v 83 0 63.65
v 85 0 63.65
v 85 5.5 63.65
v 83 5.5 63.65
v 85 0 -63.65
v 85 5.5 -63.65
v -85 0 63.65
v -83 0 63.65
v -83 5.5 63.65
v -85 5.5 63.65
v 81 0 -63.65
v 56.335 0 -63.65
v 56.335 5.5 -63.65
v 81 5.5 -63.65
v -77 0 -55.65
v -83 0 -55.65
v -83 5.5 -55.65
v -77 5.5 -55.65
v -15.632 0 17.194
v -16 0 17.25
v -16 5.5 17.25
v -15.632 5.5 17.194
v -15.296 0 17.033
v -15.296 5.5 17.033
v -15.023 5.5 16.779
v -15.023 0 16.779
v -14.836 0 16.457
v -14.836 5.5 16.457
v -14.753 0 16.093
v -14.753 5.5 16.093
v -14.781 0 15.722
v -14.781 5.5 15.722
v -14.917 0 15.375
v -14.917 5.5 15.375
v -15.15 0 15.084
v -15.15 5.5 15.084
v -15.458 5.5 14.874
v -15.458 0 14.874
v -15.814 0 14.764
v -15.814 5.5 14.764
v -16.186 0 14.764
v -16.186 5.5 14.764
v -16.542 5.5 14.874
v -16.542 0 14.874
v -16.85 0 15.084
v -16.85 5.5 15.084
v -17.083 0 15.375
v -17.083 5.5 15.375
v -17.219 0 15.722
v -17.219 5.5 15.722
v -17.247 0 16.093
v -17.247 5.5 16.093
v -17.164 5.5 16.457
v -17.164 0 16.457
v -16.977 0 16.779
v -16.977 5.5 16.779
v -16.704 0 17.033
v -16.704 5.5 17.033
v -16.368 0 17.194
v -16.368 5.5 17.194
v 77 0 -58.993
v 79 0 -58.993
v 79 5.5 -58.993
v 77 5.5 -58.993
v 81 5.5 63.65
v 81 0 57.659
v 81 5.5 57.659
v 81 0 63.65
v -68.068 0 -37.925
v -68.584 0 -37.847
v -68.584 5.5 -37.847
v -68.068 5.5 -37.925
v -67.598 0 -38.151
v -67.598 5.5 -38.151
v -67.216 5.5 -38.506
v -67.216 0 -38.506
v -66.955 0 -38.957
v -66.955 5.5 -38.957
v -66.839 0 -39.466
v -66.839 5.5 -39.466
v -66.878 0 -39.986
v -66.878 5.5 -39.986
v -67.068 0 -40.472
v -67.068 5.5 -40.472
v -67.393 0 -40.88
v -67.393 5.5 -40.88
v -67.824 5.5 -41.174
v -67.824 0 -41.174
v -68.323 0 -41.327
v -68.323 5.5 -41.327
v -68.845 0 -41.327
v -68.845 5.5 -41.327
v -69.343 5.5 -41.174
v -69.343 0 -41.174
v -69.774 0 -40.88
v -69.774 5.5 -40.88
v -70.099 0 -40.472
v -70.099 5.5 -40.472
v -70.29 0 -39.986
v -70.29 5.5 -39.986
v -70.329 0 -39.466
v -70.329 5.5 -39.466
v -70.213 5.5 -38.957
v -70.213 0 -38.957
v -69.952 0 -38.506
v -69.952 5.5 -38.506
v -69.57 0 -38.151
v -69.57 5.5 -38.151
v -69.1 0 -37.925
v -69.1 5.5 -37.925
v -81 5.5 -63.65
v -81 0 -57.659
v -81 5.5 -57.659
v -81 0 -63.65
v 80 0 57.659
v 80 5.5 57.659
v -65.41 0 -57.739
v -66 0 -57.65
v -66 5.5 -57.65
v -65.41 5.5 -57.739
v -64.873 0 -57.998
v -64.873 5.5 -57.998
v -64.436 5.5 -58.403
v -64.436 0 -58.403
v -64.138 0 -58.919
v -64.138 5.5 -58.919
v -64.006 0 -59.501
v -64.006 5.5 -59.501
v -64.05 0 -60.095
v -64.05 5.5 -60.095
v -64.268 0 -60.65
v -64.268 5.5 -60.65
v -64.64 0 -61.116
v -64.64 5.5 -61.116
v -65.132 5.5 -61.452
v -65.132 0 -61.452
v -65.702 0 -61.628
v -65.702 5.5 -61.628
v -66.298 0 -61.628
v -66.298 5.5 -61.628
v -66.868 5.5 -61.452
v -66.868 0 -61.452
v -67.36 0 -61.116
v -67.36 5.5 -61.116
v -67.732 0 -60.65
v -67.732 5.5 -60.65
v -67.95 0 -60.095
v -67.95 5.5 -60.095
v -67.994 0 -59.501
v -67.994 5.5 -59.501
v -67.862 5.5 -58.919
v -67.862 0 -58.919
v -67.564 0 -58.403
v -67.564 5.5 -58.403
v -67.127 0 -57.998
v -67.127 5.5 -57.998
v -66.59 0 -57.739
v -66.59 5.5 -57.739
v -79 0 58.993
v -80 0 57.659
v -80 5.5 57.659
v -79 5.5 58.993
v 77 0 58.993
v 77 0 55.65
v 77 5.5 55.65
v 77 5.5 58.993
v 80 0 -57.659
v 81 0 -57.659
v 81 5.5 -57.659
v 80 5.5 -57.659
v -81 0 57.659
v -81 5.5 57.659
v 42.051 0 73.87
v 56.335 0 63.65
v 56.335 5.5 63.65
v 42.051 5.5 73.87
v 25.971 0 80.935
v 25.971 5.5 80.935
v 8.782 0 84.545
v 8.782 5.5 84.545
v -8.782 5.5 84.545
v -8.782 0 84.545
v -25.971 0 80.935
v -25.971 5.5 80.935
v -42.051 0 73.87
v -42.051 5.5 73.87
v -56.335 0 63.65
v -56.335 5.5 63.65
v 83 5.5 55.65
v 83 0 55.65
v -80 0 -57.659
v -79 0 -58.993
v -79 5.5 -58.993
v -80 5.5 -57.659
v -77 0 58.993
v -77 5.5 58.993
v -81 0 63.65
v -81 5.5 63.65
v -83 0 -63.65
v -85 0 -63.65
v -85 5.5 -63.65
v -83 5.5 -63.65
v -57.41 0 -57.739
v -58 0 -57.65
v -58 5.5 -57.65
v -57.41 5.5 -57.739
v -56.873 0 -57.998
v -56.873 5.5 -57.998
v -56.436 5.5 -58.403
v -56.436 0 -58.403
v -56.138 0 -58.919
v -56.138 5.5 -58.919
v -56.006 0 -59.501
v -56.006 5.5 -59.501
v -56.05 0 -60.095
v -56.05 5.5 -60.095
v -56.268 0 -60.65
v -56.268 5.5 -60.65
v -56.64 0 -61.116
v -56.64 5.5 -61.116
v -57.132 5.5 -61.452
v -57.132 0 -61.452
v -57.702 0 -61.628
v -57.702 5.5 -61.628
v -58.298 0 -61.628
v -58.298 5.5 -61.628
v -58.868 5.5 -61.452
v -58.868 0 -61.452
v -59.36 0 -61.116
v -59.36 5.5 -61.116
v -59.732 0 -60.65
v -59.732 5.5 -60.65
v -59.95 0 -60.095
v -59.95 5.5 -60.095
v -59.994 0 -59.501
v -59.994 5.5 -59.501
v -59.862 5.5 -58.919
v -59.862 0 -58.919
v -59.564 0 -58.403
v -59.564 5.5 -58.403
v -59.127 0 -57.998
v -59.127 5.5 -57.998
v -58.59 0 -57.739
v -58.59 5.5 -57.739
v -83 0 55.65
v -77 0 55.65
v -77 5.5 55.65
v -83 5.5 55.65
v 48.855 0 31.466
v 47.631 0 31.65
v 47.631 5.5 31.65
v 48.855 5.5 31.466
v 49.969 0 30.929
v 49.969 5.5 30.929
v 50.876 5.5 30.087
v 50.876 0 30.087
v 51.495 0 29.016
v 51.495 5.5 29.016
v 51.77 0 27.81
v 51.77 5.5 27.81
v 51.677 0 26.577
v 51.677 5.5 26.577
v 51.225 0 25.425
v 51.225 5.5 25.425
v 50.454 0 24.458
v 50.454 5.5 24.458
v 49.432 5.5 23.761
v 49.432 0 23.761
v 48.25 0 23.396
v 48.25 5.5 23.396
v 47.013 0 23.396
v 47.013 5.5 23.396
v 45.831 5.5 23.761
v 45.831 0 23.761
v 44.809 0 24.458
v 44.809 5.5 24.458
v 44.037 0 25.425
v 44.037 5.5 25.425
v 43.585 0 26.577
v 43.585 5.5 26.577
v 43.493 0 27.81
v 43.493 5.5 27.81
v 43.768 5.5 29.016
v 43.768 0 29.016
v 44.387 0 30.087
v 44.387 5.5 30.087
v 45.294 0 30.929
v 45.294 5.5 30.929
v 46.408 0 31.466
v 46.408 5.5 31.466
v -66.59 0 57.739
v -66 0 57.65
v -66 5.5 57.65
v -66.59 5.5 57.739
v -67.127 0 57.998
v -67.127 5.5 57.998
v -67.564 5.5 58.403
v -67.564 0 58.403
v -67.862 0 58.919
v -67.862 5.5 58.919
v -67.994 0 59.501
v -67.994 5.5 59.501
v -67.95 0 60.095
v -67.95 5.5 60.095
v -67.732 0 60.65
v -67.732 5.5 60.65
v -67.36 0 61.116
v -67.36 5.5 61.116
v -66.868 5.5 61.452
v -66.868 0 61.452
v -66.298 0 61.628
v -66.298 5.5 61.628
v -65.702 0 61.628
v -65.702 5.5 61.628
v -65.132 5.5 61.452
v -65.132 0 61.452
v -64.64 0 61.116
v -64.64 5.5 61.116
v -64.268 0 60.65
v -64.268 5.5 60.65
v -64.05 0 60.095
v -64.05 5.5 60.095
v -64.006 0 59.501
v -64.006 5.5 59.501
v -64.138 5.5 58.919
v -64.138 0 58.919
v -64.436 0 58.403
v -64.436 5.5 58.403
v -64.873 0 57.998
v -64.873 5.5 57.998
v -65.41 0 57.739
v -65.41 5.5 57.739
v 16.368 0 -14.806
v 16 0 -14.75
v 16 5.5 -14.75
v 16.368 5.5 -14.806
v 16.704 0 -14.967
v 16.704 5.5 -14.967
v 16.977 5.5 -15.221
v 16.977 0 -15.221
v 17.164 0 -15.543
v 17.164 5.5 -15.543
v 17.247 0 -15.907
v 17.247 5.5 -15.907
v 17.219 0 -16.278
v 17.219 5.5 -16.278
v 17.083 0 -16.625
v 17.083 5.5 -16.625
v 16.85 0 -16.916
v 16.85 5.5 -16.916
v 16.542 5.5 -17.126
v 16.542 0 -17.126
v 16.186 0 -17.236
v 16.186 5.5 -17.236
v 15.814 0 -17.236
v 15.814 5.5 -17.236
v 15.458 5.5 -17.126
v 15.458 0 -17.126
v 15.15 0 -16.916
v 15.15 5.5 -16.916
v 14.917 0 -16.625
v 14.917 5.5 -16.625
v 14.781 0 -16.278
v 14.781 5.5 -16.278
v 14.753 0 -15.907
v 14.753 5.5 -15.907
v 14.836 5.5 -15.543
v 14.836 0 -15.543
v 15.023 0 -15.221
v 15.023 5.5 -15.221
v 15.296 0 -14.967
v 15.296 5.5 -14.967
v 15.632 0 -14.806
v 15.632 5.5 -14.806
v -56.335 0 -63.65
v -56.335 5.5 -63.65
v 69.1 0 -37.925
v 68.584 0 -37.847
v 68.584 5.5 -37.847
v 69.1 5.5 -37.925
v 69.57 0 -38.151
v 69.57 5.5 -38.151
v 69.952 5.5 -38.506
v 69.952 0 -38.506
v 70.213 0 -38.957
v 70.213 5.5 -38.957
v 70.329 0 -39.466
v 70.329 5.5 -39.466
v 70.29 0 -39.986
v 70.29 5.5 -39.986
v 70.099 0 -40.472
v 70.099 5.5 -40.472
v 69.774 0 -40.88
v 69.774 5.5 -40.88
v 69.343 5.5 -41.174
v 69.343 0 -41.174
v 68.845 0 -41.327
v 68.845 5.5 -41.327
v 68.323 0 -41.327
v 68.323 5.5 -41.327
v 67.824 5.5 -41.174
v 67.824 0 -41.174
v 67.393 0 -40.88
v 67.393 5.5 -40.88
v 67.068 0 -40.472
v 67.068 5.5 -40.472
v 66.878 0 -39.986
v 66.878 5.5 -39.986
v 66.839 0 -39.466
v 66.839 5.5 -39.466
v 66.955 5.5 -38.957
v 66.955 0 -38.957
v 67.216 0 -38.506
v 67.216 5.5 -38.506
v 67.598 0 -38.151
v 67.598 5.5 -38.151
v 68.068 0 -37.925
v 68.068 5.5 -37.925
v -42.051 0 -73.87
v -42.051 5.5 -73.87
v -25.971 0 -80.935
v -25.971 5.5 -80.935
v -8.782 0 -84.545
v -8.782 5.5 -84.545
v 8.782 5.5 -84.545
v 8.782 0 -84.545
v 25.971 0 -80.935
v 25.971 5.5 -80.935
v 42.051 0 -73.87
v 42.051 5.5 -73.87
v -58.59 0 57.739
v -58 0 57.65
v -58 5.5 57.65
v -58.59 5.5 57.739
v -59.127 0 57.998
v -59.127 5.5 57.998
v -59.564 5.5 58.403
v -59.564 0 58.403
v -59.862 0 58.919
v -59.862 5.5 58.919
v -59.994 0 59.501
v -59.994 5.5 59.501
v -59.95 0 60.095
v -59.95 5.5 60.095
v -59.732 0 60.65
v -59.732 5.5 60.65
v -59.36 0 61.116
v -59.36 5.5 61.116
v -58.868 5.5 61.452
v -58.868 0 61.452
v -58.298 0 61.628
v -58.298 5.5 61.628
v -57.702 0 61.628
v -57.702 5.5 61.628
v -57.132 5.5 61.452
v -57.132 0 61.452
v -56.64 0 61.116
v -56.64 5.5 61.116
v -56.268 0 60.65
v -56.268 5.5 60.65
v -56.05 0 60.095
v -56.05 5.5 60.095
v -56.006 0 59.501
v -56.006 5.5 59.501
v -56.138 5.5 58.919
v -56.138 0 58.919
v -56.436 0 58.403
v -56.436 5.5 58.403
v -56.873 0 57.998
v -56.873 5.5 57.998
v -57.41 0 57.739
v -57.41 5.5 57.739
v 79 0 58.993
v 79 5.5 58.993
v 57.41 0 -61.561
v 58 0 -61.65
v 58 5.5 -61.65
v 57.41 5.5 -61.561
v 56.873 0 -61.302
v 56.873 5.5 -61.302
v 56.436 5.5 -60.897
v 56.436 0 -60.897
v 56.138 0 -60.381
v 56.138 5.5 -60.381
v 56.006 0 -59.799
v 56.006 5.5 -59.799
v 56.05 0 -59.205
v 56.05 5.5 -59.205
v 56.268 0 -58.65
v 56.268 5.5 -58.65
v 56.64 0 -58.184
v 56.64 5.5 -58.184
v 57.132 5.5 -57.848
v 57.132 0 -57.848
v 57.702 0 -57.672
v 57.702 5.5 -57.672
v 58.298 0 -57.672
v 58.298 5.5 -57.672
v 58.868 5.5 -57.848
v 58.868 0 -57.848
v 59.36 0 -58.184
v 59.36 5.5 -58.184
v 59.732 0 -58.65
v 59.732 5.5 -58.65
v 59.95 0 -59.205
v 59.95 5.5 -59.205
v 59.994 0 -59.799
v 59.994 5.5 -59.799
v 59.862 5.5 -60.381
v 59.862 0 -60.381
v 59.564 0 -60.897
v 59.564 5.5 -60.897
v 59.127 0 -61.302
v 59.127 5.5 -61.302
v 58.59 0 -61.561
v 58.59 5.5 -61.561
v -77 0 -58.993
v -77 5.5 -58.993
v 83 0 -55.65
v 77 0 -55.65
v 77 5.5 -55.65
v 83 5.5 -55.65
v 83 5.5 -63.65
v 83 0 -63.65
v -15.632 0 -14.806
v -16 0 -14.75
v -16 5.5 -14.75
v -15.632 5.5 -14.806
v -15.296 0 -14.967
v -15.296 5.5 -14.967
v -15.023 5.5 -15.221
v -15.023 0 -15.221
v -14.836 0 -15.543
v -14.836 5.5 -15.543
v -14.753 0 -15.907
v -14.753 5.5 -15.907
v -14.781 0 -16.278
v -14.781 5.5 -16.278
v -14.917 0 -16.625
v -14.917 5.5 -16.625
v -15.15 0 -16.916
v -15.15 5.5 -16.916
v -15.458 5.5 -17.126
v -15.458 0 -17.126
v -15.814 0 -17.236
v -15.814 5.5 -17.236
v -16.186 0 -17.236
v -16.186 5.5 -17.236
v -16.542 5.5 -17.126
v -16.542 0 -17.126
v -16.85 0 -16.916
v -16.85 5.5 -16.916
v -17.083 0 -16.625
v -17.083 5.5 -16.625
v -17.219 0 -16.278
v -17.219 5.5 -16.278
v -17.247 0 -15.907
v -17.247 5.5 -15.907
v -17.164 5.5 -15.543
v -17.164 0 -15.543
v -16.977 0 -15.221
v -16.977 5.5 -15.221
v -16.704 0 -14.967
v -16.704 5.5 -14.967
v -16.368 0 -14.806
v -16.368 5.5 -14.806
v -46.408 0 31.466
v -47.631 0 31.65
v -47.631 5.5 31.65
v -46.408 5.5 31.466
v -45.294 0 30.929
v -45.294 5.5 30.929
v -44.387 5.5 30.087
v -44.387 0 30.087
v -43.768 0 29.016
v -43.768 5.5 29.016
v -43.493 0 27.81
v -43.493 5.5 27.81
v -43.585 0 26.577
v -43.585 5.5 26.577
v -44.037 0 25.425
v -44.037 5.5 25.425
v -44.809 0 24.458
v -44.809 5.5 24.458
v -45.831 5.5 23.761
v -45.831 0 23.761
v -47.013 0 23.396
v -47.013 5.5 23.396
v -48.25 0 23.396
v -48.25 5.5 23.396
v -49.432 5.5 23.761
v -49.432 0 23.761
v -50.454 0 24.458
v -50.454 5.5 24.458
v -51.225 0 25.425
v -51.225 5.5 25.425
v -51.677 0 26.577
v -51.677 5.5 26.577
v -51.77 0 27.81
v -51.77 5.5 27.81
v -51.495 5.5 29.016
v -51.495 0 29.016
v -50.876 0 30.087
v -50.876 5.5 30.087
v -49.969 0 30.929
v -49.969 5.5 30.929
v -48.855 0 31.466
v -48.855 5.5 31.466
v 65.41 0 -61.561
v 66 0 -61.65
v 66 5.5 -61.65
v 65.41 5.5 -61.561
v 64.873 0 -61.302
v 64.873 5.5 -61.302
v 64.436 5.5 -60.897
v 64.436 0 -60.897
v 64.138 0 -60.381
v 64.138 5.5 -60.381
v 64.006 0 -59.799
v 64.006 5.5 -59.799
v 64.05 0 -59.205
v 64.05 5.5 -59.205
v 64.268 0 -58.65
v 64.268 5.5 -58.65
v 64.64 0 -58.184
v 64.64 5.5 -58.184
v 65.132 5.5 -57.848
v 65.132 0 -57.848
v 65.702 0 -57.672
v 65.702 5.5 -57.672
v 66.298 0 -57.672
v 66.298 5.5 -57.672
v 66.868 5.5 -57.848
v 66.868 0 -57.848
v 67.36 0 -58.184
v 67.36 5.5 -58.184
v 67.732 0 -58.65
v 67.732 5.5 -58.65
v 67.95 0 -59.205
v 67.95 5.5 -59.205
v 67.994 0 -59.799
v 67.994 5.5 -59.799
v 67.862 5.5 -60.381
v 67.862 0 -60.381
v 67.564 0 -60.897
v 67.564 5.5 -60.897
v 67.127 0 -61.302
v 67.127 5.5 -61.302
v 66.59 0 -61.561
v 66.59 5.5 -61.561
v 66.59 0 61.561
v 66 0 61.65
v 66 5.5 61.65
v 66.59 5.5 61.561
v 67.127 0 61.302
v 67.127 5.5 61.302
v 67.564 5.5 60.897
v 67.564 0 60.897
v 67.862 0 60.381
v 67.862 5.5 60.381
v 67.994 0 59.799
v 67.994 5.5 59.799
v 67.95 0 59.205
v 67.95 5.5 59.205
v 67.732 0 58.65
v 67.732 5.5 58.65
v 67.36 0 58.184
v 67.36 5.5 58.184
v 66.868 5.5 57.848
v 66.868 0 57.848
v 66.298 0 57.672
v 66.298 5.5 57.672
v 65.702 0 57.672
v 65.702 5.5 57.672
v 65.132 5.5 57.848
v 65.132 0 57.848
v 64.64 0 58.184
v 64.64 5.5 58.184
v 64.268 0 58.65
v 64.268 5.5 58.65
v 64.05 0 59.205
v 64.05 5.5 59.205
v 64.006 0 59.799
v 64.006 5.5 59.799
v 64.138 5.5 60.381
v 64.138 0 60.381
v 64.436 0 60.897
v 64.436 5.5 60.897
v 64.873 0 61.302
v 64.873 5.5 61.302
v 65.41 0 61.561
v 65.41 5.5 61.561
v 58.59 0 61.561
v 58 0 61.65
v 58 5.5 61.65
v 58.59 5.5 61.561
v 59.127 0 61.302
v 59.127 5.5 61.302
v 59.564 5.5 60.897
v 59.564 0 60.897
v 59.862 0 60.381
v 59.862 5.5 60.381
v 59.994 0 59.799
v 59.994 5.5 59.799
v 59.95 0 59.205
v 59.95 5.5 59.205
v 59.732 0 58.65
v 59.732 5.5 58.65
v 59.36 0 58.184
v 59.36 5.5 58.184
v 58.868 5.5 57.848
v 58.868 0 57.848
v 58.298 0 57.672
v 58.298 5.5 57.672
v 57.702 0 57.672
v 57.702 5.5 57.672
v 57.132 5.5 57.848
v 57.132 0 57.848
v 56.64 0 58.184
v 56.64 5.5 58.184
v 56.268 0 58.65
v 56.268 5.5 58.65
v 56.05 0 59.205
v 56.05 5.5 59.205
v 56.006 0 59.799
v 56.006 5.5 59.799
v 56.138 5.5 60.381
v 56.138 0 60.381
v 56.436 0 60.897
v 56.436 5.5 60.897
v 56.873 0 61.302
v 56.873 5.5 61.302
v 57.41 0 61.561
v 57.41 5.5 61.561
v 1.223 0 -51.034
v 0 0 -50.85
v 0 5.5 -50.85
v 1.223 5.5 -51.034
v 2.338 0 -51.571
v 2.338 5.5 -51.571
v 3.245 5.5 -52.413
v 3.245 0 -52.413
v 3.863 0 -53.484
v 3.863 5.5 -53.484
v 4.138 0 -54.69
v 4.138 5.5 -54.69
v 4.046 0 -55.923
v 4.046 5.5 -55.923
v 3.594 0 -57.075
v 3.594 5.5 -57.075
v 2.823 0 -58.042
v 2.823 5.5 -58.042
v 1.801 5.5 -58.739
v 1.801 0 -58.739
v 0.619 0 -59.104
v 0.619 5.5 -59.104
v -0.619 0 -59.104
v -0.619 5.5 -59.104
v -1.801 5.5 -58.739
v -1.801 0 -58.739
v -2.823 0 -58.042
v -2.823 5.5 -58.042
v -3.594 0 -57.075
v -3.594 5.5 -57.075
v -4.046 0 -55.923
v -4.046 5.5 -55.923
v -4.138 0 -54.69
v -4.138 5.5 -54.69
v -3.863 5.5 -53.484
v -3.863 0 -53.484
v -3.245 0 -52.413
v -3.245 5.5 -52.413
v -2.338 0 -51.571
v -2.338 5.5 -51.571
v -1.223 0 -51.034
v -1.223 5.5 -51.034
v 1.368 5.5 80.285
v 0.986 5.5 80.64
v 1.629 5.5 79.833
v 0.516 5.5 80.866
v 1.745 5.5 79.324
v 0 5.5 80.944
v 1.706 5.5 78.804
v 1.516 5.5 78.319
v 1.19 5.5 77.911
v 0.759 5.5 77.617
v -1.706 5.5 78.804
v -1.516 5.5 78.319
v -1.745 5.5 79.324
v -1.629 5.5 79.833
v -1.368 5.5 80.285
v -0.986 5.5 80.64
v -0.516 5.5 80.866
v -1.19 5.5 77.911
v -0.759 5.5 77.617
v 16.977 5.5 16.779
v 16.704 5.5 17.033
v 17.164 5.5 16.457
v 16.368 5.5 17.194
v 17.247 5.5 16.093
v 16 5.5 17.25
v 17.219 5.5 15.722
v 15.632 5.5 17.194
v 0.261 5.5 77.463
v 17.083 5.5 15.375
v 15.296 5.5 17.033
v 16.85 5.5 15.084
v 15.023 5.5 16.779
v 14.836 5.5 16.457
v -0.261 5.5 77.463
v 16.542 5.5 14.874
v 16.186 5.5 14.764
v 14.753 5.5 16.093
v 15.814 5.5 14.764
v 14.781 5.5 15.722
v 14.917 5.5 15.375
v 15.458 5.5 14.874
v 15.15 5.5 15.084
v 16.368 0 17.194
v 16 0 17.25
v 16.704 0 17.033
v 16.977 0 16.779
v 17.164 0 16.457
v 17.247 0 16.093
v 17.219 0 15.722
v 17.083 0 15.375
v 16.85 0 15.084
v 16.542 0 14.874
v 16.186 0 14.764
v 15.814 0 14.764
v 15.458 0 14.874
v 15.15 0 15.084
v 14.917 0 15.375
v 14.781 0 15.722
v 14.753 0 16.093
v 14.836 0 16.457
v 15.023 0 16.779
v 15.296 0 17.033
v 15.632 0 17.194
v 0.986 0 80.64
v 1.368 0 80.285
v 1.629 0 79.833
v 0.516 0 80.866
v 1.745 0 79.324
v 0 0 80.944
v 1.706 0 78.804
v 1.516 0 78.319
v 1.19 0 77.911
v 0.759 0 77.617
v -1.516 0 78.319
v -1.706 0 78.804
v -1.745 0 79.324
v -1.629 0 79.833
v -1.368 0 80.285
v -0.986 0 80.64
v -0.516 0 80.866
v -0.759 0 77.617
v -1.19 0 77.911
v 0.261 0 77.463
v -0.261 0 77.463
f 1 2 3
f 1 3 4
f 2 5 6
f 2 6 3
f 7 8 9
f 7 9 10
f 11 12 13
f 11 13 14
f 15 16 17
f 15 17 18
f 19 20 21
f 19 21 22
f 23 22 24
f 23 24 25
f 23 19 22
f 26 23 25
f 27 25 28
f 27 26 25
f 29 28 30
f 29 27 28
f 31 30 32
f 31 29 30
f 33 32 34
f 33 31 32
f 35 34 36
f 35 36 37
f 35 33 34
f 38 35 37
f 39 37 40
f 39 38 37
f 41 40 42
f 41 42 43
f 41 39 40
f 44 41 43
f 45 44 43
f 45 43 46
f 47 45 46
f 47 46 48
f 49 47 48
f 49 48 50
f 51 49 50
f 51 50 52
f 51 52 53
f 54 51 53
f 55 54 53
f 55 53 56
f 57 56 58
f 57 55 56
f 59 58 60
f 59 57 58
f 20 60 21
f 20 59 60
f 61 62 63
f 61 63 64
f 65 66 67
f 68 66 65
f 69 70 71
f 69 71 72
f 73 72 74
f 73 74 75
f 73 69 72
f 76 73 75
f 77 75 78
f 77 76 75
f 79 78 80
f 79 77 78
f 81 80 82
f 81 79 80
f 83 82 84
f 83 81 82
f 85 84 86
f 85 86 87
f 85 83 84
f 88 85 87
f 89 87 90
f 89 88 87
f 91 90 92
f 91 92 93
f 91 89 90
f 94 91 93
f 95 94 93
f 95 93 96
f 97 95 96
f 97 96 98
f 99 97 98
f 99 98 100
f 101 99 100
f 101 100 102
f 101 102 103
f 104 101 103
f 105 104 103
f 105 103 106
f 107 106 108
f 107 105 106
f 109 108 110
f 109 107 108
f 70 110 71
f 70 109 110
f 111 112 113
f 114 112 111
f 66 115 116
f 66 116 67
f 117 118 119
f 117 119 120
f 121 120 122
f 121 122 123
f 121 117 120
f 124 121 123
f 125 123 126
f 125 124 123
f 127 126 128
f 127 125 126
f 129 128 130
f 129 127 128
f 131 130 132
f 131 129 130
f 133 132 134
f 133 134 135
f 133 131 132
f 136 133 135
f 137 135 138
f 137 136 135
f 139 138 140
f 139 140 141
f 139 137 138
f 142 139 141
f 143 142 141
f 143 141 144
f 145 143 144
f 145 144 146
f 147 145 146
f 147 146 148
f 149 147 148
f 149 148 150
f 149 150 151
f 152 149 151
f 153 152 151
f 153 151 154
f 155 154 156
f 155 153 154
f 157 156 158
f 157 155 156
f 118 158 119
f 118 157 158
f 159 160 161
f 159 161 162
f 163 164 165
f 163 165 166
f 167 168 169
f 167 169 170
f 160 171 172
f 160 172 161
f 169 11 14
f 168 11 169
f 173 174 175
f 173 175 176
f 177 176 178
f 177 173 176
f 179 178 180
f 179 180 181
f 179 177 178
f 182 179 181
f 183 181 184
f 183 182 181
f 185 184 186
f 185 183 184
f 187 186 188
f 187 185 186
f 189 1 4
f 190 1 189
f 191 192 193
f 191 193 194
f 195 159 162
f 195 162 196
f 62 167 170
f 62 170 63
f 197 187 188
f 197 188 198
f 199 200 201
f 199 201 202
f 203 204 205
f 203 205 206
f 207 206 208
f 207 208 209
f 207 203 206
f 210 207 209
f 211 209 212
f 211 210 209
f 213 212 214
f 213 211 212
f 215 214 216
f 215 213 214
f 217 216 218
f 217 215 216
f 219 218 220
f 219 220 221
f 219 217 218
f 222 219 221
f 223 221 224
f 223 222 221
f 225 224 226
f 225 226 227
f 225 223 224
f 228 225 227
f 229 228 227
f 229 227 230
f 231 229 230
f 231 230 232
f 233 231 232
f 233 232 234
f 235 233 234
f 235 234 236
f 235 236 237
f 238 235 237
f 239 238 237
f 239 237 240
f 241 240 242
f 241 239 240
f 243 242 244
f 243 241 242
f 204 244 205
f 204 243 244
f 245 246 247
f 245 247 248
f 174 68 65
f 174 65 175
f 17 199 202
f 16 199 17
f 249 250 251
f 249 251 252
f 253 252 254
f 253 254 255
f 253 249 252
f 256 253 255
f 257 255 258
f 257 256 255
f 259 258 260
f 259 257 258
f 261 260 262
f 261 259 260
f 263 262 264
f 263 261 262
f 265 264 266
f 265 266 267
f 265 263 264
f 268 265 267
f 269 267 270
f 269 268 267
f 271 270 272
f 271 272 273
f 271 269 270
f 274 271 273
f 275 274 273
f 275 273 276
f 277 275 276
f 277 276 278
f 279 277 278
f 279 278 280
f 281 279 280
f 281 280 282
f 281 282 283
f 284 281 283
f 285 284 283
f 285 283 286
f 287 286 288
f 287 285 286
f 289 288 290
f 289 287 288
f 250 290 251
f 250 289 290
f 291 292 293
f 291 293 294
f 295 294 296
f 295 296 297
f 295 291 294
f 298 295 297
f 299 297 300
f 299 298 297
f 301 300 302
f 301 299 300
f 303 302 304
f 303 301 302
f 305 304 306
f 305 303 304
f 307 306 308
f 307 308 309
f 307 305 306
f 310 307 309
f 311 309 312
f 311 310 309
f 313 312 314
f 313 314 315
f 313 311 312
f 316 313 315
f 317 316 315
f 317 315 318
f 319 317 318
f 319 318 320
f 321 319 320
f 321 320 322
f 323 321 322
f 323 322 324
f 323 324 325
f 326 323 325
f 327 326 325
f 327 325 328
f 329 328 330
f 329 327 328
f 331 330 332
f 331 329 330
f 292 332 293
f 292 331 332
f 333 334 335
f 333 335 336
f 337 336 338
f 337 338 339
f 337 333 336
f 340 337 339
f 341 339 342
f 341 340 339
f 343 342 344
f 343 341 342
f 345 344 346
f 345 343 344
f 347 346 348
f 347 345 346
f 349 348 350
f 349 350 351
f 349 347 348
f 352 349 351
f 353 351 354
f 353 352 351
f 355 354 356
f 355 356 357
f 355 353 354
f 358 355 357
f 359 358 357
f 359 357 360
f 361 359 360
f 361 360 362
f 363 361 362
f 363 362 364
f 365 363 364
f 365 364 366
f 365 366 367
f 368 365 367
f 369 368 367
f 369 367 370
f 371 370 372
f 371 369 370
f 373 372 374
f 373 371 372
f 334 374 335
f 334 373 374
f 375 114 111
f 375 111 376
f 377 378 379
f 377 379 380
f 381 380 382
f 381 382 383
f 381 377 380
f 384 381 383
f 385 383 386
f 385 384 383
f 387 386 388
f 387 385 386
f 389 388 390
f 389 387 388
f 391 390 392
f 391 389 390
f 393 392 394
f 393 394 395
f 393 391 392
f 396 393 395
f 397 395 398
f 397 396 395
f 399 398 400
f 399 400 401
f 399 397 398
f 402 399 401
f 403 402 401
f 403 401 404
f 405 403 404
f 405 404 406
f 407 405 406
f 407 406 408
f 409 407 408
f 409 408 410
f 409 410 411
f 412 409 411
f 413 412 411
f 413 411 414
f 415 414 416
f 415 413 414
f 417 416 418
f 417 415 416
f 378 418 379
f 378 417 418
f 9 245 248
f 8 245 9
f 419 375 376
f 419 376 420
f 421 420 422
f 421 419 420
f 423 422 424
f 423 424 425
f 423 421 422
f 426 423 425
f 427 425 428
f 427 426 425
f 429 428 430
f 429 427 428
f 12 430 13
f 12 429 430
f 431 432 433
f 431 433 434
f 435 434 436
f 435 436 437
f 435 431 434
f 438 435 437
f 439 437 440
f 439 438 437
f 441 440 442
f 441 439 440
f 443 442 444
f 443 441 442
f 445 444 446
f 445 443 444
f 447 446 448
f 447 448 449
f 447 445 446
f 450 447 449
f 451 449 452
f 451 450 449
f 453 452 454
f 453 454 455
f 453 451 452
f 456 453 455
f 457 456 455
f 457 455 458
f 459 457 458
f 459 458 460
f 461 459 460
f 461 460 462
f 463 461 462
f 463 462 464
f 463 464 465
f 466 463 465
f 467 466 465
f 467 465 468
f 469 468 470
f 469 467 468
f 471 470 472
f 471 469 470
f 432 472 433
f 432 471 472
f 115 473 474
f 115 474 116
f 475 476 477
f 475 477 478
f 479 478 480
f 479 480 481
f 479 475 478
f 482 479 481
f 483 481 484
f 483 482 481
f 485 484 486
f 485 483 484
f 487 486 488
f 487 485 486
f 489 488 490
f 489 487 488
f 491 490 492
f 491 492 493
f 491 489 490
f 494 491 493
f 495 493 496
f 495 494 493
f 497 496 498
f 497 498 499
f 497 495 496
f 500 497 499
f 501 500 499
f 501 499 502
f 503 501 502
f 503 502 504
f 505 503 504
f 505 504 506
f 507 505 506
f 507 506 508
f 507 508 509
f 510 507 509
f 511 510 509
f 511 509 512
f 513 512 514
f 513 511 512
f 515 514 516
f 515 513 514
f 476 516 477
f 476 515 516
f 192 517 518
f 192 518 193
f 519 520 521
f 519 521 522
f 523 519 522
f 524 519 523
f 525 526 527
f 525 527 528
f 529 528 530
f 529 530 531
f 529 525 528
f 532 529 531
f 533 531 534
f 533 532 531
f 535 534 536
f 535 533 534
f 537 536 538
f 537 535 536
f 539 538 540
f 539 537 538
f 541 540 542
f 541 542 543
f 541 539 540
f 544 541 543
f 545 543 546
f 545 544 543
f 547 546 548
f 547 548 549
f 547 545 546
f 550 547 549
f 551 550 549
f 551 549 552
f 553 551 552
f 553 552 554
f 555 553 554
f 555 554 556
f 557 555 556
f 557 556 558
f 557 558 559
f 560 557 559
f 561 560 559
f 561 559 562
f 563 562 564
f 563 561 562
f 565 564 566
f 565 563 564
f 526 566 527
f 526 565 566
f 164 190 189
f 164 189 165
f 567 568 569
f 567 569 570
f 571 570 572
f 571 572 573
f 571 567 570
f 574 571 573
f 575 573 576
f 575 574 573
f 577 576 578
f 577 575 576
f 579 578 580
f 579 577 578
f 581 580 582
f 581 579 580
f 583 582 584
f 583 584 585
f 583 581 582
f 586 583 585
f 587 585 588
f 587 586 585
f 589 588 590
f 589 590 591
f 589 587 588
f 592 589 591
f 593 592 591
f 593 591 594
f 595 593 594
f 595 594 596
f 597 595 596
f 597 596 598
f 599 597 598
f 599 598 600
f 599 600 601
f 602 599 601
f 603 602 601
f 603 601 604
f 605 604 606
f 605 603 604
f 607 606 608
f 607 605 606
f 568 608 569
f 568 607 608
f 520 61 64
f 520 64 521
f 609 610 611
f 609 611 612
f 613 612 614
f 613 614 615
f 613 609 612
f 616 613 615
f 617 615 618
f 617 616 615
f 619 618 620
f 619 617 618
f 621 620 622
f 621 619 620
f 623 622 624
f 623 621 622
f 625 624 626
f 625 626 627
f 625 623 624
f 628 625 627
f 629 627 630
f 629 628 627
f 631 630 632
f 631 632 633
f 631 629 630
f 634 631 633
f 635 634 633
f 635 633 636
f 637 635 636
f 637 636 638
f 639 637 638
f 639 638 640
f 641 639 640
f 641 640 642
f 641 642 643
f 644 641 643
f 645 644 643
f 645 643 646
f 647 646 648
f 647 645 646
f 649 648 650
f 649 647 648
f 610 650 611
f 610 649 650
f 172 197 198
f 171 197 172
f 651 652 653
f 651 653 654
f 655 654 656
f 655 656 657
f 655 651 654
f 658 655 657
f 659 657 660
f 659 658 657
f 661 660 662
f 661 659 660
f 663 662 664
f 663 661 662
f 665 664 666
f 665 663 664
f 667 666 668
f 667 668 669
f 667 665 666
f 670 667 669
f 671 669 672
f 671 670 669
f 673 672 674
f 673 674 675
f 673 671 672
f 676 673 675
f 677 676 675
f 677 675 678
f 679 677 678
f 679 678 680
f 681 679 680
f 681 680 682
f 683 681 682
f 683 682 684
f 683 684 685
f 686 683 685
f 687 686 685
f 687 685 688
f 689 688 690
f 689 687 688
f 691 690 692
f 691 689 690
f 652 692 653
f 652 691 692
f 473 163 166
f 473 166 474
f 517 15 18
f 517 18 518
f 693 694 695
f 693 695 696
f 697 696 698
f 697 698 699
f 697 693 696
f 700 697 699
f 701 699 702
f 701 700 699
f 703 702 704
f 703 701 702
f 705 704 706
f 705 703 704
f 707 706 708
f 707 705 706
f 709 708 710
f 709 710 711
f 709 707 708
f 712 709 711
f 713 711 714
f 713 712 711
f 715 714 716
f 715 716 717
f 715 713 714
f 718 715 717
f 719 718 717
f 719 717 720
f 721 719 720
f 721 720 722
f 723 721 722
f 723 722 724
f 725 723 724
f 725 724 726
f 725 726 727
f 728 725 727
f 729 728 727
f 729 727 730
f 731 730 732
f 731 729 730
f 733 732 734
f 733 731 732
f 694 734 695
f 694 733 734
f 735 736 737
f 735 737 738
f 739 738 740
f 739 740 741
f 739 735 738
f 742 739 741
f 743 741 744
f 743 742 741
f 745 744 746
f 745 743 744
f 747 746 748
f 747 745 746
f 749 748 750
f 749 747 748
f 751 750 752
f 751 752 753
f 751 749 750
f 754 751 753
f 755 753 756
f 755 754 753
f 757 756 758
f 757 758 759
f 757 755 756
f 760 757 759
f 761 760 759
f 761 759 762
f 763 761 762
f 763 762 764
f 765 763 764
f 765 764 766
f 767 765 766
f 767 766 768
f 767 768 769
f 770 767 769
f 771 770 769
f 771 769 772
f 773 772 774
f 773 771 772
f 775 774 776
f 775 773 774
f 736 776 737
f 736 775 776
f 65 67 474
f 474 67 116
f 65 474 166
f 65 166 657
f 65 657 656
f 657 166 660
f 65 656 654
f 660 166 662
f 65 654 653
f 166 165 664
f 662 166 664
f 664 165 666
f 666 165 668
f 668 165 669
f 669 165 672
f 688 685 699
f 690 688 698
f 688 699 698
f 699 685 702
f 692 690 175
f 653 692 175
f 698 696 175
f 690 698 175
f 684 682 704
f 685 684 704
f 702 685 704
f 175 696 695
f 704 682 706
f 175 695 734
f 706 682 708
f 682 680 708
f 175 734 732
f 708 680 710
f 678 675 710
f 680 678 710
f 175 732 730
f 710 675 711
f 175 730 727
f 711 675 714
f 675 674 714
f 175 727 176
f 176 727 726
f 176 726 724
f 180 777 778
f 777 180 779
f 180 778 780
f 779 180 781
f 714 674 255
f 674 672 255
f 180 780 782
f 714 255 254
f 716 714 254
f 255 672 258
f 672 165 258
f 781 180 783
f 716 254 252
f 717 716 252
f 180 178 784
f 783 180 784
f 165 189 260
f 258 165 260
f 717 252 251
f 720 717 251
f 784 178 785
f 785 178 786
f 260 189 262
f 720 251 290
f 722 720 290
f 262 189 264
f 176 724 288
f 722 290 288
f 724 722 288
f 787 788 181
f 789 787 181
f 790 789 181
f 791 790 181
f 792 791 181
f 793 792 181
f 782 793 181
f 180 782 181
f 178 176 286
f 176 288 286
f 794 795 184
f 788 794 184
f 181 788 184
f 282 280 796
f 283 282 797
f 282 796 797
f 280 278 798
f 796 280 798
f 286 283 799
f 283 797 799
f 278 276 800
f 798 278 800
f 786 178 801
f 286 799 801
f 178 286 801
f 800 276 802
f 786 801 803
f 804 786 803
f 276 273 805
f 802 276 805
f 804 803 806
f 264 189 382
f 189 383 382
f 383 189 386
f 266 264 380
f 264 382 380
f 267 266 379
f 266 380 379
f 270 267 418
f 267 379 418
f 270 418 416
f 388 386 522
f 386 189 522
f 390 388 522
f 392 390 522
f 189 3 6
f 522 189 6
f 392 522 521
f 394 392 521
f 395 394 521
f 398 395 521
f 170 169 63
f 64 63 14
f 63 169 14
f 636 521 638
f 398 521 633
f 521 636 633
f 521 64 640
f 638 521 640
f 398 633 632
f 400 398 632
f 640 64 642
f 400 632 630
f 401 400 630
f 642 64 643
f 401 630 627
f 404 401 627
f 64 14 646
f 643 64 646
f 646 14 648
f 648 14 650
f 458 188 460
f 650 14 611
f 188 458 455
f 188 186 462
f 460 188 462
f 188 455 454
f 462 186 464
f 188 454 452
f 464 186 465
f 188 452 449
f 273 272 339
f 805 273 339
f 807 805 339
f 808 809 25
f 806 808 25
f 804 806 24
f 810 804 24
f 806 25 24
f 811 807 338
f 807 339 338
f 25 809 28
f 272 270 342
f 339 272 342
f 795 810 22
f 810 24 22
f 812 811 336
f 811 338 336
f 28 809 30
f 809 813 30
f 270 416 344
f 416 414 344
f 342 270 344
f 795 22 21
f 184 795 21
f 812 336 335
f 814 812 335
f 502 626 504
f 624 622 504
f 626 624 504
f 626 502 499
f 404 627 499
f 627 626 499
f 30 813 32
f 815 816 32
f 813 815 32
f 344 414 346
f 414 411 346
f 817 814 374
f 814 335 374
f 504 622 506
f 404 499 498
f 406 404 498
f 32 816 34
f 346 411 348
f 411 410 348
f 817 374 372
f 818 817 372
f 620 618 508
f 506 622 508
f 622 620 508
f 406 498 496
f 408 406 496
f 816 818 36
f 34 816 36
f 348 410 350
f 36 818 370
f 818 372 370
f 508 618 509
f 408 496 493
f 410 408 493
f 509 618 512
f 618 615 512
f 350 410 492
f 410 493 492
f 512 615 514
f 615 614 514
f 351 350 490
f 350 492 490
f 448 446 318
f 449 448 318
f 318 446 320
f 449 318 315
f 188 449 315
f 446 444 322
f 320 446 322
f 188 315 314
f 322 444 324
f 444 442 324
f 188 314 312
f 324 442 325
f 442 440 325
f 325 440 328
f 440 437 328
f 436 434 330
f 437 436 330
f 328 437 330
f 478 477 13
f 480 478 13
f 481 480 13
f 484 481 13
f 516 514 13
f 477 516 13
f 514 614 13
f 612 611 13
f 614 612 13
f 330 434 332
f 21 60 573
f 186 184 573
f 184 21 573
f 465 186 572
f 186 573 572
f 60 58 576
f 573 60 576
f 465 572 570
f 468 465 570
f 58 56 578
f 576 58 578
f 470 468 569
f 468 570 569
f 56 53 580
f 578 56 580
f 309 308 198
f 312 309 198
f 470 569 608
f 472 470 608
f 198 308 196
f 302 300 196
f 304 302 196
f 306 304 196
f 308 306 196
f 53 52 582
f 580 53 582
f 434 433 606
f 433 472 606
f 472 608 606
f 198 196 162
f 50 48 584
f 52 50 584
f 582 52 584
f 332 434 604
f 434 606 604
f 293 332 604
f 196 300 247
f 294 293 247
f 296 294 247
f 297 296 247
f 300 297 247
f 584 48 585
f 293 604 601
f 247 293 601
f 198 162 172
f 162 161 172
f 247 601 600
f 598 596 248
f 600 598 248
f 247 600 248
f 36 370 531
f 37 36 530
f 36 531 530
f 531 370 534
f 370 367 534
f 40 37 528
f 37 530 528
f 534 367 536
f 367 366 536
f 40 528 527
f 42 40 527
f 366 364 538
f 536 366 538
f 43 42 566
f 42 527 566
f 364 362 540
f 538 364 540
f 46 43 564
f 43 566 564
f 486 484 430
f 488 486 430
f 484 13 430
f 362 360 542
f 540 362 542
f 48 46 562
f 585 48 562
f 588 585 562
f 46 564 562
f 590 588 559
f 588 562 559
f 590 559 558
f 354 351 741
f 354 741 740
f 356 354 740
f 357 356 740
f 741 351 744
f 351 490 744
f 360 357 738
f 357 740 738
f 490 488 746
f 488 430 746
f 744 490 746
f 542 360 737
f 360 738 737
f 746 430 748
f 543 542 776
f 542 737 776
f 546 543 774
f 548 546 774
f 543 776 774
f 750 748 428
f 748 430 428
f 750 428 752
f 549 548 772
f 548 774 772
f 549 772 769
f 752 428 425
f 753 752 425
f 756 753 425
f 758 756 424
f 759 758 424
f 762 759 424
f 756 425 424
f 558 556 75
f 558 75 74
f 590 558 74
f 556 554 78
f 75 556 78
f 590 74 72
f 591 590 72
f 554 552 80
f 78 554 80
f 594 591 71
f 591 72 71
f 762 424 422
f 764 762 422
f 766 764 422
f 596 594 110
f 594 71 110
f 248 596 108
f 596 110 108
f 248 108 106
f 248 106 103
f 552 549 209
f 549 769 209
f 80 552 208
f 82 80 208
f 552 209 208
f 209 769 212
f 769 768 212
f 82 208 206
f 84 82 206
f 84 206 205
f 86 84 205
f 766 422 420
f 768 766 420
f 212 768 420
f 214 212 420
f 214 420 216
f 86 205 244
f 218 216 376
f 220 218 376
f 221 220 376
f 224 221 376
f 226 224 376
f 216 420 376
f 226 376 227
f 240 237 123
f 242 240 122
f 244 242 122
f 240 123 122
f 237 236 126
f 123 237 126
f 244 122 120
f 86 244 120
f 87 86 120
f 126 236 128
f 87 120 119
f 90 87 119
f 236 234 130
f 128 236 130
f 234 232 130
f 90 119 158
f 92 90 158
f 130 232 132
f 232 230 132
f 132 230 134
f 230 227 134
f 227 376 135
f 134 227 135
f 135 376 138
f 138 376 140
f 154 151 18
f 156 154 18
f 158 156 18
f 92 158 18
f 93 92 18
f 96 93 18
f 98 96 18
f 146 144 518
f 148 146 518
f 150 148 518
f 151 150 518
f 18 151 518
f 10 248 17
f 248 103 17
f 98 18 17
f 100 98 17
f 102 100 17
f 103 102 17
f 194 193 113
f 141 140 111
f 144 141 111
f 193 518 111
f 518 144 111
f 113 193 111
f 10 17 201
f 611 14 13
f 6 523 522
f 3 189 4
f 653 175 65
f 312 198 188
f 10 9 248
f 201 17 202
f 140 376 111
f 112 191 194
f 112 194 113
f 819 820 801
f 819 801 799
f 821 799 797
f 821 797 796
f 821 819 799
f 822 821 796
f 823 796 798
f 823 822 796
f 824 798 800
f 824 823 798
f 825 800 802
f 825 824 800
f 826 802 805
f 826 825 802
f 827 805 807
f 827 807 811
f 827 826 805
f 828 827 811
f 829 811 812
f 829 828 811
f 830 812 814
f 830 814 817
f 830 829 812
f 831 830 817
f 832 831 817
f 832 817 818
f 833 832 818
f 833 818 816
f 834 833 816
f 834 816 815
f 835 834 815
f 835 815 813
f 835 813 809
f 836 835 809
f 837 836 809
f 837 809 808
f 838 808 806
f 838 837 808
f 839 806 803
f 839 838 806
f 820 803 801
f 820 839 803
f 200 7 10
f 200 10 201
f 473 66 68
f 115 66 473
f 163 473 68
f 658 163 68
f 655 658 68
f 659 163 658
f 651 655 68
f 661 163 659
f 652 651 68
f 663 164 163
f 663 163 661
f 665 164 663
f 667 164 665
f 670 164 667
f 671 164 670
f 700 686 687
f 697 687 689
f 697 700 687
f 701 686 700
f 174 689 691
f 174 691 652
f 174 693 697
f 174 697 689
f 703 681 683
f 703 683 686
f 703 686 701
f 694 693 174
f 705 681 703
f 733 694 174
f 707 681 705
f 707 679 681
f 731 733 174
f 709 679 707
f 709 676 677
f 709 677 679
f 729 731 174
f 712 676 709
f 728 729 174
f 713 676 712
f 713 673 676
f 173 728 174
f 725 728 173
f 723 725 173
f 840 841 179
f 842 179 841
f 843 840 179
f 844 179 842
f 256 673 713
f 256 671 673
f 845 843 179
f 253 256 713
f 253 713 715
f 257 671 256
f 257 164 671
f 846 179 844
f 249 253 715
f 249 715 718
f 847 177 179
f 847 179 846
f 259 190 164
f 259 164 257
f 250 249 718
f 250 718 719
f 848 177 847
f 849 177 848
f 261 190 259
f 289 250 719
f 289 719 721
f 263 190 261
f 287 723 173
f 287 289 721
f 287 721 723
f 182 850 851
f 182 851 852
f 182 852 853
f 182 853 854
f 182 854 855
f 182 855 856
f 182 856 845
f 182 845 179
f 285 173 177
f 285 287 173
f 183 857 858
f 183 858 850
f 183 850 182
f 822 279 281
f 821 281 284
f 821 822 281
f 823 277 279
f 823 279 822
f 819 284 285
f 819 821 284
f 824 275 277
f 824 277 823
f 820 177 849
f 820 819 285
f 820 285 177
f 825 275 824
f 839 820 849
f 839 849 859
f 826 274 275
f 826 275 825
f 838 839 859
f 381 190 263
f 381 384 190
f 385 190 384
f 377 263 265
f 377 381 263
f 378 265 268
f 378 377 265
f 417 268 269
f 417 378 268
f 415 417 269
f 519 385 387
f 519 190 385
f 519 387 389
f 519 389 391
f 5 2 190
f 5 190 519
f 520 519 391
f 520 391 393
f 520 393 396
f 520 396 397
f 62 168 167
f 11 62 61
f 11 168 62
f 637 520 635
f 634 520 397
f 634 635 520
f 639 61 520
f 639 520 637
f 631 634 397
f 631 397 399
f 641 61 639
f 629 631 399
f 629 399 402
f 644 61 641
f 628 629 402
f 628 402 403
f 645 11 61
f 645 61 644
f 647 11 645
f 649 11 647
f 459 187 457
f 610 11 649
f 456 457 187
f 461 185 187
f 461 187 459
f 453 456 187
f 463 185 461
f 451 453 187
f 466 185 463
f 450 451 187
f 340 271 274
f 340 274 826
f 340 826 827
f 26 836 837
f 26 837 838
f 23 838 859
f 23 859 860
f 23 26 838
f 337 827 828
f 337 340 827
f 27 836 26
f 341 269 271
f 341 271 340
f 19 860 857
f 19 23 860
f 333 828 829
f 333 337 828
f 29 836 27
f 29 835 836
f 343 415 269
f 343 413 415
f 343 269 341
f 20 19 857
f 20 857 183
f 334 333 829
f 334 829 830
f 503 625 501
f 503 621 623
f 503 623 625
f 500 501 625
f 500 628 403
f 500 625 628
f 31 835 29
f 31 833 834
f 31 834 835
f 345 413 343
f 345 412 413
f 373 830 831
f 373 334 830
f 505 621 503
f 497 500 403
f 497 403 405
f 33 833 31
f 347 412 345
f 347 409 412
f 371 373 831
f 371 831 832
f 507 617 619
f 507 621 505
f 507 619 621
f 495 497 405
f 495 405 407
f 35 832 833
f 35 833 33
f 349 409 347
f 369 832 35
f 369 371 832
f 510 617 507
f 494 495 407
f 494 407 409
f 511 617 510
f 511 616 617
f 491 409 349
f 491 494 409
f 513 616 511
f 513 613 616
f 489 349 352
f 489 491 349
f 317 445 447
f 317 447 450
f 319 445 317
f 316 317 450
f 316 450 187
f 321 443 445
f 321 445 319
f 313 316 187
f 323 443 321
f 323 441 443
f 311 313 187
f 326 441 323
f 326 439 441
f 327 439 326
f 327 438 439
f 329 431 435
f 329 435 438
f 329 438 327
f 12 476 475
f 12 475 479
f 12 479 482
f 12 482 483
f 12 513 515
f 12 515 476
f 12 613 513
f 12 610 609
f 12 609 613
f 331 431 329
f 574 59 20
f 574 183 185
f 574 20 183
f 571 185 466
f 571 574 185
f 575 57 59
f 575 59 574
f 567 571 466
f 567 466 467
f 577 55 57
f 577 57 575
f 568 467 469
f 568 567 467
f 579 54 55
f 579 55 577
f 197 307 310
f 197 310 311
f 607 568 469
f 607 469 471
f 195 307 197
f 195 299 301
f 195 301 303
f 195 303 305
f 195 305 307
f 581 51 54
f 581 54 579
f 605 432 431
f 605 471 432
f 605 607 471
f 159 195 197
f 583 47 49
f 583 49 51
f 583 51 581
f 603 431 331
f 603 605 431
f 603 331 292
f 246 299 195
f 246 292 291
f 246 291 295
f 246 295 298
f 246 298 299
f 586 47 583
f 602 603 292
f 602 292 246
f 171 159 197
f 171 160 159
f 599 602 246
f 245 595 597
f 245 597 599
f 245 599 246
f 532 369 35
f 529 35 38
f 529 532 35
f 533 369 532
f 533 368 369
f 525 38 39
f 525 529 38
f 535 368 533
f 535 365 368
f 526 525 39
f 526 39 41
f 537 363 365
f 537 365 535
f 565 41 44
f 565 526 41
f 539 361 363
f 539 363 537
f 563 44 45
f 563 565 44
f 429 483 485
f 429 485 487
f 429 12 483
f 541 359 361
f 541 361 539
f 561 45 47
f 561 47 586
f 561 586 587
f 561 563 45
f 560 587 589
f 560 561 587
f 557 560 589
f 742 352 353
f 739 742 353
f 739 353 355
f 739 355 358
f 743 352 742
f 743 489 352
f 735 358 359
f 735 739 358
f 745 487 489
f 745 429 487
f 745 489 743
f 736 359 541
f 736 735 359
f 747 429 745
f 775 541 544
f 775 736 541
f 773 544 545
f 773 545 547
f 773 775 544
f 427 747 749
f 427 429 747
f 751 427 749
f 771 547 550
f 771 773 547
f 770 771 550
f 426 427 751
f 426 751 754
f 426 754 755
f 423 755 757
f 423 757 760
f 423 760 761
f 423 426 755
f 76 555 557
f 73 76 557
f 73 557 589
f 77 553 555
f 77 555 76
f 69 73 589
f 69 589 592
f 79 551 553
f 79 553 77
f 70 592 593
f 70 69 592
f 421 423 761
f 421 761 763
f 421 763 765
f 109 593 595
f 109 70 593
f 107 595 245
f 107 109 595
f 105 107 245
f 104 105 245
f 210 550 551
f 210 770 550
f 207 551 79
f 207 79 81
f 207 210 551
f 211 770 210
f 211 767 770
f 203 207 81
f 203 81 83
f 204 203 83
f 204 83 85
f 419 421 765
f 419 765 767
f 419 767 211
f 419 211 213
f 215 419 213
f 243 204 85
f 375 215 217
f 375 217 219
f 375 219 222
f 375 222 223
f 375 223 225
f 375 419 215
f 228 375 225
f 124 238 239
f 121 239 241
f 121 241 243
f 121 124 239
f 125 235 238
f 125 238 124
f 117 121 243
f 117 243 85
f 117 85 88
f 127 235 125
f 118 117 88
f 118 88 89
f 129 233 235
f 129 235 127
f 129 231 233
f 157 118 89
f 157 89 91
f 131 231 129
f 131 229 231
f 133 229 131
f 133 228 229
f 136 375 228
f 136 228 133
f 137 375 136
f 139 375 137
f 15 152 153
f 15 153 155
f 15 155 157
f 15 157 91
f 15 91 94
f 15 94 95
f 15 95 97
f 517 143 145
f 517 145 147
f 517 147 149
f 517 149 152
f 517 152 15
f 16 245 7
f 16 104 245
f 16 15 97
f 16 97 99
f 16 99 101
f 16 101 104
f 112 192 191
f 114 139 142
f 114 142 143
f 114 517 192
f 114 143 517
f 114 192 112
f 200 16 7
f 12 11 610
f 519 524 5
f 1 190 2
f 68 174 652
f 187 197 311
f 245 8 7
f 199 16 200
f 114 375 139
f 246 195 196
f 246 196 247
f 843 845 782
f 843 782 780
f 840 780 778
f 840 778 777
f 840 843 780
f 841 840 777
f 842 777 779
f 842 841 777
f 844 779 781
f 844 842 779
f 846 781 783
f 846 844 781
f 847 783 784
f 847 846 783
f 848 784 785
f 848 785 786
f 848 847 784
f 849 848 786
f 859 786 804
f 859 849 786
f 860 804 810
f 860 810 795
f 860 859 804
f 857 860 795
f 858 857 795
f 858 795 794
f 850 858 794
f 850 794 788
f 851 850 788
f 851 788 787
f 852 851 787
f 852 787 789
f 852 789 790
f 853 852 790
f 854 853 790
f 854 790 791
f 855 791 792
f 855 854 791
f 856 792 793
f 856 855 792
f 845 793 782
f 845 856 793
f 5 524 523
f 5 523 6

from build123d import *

# Parameters (mm, degrees)
SKETCH4_R           = 2
SKETCH4_R_2         = 1.25
SKETCH4_R_3         = 4.15
SKETCH4_R_4         = 1.75
BOSS_EXTRUDE1_DEPTH = 5.5


with BuildPart() as part:
    # Sketch4 → Boss-Extrude1 (new body)
    with BuildSketch(Plane(origin=(0, 0, 0), x_dir=(1, 0, 0), z_dir=(0, 1, 0))):
        with BuildLine():
            Line((56.335401836, 63.65), (81, 63.65))
            Line((81, 63.65), (81, 57.659411765))
            Line((81, 57.659411765), (80, 57.659411765))
            Line((80, 57.659411765), (79, 58.992745098))
            Line((79, 58.992745098), (77, 58.992745098))
            Line((77, 58.992745098), (77, 55.65))
            Line((77, 55.65), (83, 55.65))
            Line((83, 55.65), (83, 63.65))
            Line((83, 63.65), (85, 63.65))
            Line((85, 63.65), (85, -63.65))
            Line((85, -63.65), (83, -63.65))
            Line((83, -63.65), (83, -55.65))
            Line((83, -55.65), (77, -55.65))
            Line((77, -55.65), (77, -58.992745098))
            Line((77, -58.992745098), (79, -58.992745098))
            Line((79, -58.992745098), (80, -57.659411765))
            Line((80, -57.659411765), (81, -57.659411765))
            Line((81, -57.659411765), (81, -63.65))
            Line((81, -63.65), (56.335401836, -63.65))
            ThreePointArc((56.335401836, -63.65), (0, -85), (-56.335401836, -63.65))
            Line((-56.335401836, -63.65), (-81, -63.65))
            Line((-81, -63.65), (-81, -57.659411765))
            Line((-81, -57.659411765), (-80, -57.659411765))
            Line((-80, -57.659411765), (-79, -58.992745098))
            Line((-79, -58.992745098), (-77, -58.992745098))
            Line((-77, -58.992745098), (-77, -55.65))
            Line((-77, -55.65), (-83, -55.65))
            Line((-83, -55.65), (-83, -63.65))
            Line((-83, -63.65), (-85, -63.65))
            Line((-85, -63.65), (-85, 63.65))
            Line((-85, 63.65), (-83, 63.65))
            Line((-83, 63.65), (-83, 55.65))
            Line((-83, 55.65), (-77, 55.65))
            Line((-77, 55.65), (-77, 58.992745098))
            Line((-77, 58.992745098), (-79, 58.992745098))
            Line((-79, 58.992745098), (-80, 57.659411765))
            Line((-80, 57.659411765), (-81, 57.659411765))
            Line((-81, 57.659411765), (-81, 63.65))
            Line((-81, 63.65), (-56.335401836, 63.65))
            ThreePointArc((-56.335401836, 63.65), (0, 85), (56.335401836, 63.65))
        make_face()
        with Locations(Location((-58, 59.65, 0), (0, 0, 270))):
            Circle(SKETCH4_R, mode=Mode.SUBTRACT)
        with Locations(Location((-66, 59.65, 0), (0, 0, 270))):
            Circle(SKETCH4_R, mode=Mode.SUBTRACT)
        with Locations(Location((66, 59.65, 0), (0, 0, 90))):
            Circle(SKETCH4_R, mode=Mode.SUBTRACT)
        with Locations(Location((58, 59.65, 0), (0, 0, 90))):
            Circle(SKETCH4_R, mode=Mode.SUBTRACT)
        with Locations(Location((66, -59.65, 0), (0, 0, 270))):
            Circle(SKETCH4_R, mode=Mode.SUBTRACT)
        with Locations(Location((58, -59.65, 0), (0, 0, 270))):
            Circle(SKETCH4_R, mode=Mode.SUBTRACT)
        with Locations(Location((-58, -59.65, 0), (0, 0, 90))):
            Circle(SKETCH4_R, mode=Mode.SUBTRACT)
        with Locations(Location((-66, -59.65, 0), (0, 0, 90))):
            Circle(SKETCH4_R, mode=Mode.SUBTRACT)
        with Locations(Location((-16, 16, 0), (0, 0, 270))):
            Circle(SKETCH4_R_2, mode=Mode.SUBTRACT)
        with Locations(Location((16, 16, 0), (0, 0, 270))):
            Circle(SKETCH4_R_2, mode=Mode.SUBTRACT)
        with Locations(Location((16, -16, 0), (0, 0, 270))):
            Circle(SKETCH4_R_2, mode=Mode.SUBTRACT)
        with Locations(Location((-16, -16, 0), (0, 0, 270))):
            Circle(SKETCH4_R_2, mode=Mode.SUBTRACT)
        with Locations(Location((0, 55, 0), (0, 0, 270))):
            Circle(SKETCH4_R_3, mode=Mode.SUBTRACT)
        with Locations(Location((47.631397208, -27.5, 0), (0, 0, 270))):
            Circle(SKETCH4_R_3, mode=Mode.SUBTRACT)
        with Locations(Location((-47.631397208, -27.5, 0), (0, 0, 270))):
            Circle(SKETCH4_R_3, mode=Mode.SUBTRACT)
        with Locations(Location((0, -79.193683245, 0), (0, 0, 270))):
            Circle(SKETCH4_R_4, mode=Mode.SUBTRACT)
        with Locations(Location((-68.58374151, 39.596841623, 0), (0, 0, 270))):
            Circle(SKETCH4_R_4, mode=Mode.SUBTRACT)
        with Locations(Location((68.58374151, 39.596841623, 0), (0, 0, 270))):
            Circle(SKETCH4_R_4, mode=Mode.SUBTRACT)
    extrude(amount=BOSS_EXTRUDE1_DEPTH)


solid = part.part
